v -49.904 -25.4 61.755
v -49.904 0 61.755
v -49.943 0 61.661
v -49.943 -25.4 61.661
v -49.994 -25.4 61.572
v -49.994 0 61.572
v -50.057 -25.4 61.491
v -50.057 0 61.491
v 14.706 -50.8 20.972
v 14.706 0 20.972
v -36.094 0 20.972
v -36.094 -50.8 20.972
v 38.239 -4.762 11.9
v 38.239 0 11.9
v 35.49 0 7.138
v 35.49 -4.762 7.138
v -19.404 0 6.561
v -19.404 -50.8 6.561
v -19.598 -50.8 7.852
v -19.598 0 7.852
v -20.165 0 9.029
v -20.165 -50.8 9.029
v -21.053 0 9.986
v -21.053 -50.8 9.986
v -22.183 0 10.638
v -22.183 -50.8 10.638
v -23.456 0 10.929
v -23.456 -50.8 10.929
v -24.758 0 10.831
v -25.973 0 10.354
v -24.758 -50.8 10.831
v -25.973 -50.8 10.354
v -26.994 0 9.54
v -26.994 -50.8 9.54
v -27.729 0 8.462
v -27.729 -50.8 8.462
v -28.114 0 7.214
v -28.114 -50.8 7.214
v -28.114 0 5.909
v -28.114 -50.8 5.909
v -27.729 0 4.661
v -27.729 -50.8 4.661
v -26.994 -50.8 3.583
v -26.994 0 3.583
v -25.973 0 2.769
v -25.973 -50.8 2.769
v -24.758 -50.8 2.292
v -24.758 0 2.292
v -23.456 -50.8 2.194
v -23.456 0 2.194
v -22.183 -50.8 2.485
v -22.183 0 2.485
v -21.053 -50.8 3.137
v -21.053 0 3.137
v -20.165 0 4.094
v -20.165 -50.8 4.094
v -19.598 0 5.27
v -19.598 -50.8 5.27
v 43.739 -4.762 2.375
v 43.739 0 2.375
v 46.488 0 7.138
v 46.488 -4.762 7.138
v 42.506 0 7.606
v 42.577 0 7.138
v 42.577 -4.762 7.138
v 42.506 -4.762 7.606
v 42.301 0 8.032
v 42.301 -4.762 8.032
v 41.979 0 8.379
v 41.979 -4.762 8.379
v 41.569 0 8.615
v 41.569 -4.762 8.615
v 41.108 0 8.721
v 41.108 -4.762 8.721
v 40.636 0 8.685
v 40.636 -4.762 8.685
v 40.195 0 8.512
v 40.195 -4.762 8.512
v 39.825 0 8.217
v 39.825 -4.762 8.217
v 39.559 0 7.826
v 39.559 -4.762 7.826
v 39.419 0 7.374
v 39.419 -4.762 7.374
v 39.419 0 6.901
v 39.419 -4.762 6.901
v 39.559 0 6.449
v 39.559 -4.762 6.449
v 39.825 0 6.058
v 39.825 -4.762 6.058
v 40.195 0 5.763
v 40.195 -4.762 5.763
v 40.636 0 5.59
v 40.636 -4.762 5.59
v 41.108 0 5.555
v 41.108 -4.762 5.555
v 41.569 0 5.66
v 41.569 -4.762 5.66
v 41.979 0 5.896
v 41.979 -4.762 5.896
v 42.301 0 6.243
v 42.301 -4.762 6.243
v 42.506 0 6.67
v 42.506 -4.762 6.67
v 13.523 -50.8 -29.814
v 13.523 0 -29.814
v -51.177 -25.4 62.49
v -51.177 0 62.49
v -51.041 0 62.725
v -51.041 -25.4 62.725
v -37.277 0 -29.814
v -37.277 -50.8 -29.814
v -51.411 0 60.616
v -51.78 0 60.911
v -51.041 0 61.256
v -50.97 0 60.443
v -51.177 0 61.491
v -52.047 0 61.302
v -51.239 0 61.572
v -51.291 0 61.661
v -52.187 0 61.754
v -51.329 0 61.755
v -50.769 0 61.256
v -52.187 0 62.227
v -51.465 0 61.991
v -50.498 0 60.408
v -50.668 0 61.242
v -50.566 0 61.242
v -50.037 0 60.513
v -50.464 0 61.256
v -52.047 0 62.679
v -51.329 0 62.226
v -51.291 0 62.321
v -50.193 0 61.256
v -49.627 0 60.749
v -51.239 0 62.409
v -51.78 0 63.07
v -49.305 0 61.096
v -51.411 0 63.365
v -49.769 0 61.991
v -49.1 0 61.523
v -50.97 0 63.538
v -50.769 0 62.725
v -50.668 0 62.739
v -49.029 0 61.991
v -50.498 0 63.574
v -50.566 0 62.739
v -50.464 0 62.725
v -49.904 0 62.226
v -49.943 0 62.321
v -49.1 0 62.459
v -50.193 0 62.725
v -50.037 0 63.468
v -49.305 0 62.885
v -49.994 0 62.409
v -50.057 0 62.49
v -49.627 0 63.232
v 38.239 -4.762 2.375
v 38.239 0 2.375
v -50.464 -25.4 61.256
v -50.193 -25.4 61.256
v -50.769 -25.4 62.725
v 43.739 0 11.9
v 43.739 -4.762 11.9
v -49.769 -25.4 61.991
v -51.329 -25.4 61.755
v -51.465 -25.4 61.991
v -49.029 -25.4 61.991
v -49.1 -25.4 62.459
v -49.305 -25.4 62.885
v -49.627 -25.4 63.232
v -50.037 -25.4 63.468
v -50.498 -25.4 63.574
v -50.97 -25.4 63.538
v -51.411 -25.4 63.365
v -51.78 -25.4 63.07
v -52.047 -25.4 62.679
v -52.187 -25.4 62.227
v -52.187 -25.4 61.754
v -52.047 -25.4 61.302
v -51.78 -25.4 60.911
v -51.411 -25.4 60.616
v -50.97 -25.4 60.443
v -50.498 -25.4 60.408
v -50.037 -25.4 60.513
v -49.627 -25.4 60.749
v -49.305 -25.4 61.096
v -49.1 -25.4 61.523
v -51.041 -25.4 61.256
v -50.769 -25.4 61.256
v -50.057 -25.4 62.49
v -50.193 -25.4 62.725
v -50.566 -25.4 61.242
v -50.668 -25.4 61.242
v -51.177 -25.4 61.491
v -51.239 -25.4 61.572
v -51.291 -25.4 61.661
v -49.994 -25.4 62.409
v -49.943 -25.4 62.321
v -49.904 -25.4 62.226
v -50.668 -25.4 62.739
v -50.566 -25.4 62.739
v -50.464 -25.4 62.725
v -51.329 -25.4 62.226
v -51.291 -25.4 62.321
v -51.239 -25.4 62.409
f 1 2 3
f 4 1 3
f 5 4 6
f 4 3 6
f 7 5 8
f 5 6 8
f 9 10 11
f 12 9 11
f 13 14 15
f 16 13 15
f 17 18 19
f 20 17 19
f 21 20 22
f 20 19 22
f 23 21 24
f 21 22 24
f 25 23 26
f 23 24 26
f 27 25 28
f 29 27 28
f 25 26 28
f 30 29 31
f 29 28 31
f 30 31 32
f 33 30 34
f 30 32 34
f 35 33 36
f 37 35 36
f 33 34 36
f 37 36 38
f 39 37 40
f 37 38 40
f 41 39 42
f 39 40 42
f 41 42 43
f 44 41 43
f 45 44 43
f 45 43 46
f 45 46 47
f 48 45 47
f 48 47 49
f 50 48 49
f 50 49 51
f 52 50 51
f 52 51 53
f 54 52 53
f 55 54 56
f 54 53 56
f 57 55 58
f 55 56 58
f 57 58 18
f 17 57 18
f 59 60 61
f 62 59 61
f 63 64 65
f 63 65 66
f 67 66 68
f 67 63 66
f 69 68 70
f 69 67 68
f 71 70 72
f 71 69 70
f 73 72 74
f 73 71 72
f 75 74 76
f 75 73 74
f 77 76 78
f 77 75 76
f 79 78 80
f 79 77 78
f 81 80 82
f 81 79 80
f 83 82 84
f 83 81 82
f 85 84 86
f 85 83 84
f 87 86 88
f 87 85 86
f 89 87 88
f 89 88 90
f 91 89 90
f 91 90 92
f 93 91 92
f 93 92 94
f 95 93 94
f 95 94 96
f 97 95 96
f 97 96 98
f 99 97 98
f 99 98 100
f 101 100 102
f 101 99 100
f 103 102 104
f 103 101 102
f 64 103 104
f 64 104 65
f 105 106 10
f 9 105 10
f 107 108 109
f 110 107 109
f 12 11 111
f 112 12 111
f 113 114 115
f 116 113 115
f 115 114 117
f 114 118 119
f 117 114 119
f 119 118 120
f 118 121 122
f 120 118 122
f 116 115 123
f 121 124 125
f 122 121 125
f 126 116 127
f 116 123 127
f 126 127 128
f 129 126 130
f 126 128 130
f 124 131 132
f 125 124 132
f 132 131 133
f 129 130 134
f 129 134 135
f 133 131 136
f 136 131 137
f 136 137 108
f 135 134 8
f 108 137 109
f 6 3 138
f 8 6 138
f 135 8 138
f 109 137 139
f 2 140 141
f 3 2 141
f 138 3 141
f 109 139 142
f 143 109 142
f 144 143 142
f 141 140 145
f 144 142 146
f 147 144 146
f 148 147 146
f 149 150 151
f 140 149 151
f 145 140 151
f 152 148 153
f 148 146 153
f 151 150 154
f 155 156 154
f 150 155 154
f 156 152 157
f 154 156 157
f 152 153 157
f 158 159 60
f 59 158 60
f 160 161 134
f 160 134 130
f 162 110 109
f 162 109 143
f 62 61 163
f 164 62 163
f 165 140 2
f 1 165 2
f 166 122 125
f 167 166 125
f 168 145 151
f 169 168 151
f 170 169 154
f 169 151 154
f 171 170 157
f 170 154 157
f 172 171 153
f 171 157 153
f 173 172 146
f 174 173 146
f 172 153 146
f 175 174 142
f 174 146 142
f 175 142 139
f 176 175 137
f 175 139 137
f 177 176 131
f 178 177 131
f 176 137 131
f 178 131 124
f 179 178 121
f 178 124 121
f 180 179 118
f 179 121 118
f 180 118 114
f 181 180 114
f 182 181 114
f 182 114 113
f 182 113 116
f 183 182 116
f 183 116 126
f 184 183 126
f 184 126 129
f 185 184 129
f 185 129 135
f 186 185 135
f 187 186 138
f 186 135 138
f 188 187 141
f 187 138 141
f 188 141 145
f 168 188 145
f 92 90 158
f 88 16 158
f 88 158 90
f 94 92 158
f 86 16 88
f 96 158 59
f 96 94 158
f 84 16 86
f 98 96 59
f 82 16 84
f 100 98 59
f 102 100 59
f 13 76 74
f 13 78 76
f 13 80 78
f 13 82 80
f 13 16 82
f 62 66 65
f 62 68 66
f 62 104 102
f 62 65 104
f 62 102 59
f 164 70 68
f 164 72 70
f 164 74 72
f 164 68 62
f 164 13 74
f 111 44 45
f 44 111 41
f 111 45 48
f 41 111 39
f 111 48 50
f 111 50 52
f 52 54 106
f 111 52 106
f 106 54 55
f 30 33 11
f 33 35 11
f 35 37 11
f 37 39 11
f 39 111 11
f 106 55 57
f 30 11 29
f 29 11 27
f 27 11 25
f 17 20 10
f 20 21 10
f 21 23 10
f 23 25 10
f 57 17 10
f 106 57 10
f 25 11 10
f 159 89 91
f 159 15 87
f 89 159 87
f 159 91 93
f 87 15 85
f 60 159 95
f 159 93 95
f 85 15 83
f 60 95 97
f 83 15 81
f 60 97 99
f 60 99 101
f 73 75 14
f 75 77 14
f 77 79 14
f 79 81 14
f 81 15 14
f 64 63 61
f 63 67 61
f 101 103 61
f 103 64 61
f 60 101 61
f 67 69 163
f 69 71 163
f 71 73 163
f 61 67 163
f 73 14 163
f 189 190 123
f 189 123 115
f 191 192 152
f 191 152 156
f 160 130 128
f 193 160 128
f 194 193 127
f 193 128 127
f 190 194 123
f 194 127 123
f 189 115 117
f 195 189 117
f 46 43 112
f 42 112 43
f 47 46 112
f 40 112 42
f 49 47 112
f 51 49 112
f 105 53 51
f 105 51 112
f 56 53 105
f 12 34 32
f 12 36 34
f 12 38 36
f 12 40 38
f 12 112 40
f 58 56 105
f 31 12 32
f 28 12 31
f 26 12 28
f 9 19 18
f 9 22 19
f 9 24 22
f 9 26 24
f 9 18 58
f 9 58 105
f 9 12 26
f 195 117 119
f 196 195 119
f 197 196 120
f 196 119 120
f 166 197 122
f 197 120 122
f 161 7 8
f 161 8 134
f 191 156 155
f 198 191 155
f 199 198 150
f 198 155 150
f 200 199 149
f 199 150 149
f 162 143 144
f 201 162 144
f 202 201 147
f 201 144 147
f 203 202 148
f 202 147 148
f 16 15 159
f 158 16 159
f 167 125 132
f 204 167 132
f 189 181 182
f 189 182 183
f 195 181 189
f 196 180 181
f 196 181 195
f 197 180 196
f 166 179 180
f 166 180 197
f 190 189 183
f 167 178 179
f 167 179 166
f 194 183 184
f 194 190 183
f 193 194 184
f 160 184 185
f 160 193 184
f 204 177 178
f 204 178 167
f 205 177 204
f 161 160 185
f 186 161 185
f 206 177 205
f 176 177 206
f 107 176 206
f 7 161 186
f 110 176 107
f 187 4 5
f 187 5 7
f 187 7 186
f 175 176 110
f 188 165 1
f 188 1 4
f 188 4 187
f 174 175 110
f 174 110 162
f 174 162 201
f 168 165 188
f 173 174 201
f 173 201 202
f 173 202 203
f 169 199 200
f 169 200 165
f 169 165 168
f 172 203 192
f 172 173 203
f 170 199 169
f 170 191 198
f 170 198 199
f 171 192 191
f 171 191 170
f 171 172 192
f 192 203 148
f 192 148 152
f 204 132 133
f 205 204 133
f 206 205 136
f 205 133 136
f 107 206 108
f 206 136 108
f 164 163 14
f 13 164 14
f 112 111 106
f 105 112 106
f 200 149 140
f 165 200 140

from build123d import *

# Parameters (mm, degrees)
F1_DEPTH = 50.8
F2_R     = 4.379627
F3_DEPTH = 50.8
F4_R     = 1.5875
F5_DEPTH = 4.7625
F6_R     = 1.5875
F7_DEPTH = 25.4


with BuildPart() as f1:
    # F0 (on Front) → F1 (new body)
    with BuildSketch(Plane.XZ):
        Polygon((14.706183, 20.972032), (-36.093817, 20.972032), (-37.276511, -29.814199), (13.523489, -29.814199), align=None)
    extrude(amount=F1_DEPTH)

    # F2 (on face) → F3 (cut)
    with BuildSketch(Plane.XZ.offset(50.8)):
        with Locations((-23.783537, 6.561407)):
            Circle(F2_R)
    extrude(amount=-F3_DEPTH, mode=Mode.SUBTRACT)


with BuildPart() as f5:
    # F4 (on Front) → F5 (new body)
    with BuildSketch(Plane.XZ):
        Polygon((38.239398, 2.375156), (43.738659, 2.375156), (46.48829, 7.137656), (43.738659, 11.900156), (38.239398, 11.900156), (35.489767, 7.137656), align=None)
        with Locations((40.989028, 7.137656)):
            Circle(F4_R, mode=Mode.SUBTRACT)
    extrude(amount=F5_DEPTH)


with BuildPart() as f7:
    # F6 (on Front) → F7 (new body)
    with BuildSketch(Plane.XZ):
        with Locations((-50.616756, 61.990615)):
            Circle(F6_R)
        with BuildLine():
            Line((-51.176698, 62.48991), (-51.040861, 62.725186))
            Line((-51.040861, 62.725186), (-50.769187, 62.725186))
            ThreePointArc((-50.769187, 62.725186), (-50.616756, 62.740835), (-50.464325, 62.725186))
            Line((-50.464325, 62.725186), (-50.192651, 62.725186))
            Line((-50.192651, 62.725186), (-50.056814, 62.48991))
            ThreePointArc((-50.056814, 62.48991), (-49.967046, 62.365725), (-49.904383, 62.225892))
            Line((-49.904383, 62.225892), (-49.768546, 61.990615))
            Line((-49.768546, 61.990615), (-49.904383, 61.755338))
            ThreePointArc((-49.904383, 61.755338), (-49.967046, 61.615505), (-50.056814, 61.49132))
            Line((-50.056814, 61.49132), (-50.192651, 61.256044))
            Line((-50.192651, 61.256044), (-50.464325, 61.256044))
            ThreePointArc((-50.464325, 61.256044), (-50.616756, 61.240395), (-50.769187, 61.256044))
            Line((-50.769187, 61.256044), (-51.040861, 61.256044))
            Line((-51.040861, 61.256044), (-51.176698, 61.49132))
            ThreePointArc((-51.176698, 61.49132), (-51.266466, 61.615505), (-51.329129, 61.755338))
            Line((-51.329129, 61.755338), (-51.464966, 61.990615))
            Line((-51.464966, 61.990615), (-51.329129, 62.225892))
            ThreePointArc((-51.329129, 62.225892), (-51.266466, 62.365725), (-51.176698, 62.48991))
        make_face(mode=Mode.SUBTRACT)
    extrude(amount=F7_DEPTH)


solid = Compound([f1.part, f5.part, f7.part])
